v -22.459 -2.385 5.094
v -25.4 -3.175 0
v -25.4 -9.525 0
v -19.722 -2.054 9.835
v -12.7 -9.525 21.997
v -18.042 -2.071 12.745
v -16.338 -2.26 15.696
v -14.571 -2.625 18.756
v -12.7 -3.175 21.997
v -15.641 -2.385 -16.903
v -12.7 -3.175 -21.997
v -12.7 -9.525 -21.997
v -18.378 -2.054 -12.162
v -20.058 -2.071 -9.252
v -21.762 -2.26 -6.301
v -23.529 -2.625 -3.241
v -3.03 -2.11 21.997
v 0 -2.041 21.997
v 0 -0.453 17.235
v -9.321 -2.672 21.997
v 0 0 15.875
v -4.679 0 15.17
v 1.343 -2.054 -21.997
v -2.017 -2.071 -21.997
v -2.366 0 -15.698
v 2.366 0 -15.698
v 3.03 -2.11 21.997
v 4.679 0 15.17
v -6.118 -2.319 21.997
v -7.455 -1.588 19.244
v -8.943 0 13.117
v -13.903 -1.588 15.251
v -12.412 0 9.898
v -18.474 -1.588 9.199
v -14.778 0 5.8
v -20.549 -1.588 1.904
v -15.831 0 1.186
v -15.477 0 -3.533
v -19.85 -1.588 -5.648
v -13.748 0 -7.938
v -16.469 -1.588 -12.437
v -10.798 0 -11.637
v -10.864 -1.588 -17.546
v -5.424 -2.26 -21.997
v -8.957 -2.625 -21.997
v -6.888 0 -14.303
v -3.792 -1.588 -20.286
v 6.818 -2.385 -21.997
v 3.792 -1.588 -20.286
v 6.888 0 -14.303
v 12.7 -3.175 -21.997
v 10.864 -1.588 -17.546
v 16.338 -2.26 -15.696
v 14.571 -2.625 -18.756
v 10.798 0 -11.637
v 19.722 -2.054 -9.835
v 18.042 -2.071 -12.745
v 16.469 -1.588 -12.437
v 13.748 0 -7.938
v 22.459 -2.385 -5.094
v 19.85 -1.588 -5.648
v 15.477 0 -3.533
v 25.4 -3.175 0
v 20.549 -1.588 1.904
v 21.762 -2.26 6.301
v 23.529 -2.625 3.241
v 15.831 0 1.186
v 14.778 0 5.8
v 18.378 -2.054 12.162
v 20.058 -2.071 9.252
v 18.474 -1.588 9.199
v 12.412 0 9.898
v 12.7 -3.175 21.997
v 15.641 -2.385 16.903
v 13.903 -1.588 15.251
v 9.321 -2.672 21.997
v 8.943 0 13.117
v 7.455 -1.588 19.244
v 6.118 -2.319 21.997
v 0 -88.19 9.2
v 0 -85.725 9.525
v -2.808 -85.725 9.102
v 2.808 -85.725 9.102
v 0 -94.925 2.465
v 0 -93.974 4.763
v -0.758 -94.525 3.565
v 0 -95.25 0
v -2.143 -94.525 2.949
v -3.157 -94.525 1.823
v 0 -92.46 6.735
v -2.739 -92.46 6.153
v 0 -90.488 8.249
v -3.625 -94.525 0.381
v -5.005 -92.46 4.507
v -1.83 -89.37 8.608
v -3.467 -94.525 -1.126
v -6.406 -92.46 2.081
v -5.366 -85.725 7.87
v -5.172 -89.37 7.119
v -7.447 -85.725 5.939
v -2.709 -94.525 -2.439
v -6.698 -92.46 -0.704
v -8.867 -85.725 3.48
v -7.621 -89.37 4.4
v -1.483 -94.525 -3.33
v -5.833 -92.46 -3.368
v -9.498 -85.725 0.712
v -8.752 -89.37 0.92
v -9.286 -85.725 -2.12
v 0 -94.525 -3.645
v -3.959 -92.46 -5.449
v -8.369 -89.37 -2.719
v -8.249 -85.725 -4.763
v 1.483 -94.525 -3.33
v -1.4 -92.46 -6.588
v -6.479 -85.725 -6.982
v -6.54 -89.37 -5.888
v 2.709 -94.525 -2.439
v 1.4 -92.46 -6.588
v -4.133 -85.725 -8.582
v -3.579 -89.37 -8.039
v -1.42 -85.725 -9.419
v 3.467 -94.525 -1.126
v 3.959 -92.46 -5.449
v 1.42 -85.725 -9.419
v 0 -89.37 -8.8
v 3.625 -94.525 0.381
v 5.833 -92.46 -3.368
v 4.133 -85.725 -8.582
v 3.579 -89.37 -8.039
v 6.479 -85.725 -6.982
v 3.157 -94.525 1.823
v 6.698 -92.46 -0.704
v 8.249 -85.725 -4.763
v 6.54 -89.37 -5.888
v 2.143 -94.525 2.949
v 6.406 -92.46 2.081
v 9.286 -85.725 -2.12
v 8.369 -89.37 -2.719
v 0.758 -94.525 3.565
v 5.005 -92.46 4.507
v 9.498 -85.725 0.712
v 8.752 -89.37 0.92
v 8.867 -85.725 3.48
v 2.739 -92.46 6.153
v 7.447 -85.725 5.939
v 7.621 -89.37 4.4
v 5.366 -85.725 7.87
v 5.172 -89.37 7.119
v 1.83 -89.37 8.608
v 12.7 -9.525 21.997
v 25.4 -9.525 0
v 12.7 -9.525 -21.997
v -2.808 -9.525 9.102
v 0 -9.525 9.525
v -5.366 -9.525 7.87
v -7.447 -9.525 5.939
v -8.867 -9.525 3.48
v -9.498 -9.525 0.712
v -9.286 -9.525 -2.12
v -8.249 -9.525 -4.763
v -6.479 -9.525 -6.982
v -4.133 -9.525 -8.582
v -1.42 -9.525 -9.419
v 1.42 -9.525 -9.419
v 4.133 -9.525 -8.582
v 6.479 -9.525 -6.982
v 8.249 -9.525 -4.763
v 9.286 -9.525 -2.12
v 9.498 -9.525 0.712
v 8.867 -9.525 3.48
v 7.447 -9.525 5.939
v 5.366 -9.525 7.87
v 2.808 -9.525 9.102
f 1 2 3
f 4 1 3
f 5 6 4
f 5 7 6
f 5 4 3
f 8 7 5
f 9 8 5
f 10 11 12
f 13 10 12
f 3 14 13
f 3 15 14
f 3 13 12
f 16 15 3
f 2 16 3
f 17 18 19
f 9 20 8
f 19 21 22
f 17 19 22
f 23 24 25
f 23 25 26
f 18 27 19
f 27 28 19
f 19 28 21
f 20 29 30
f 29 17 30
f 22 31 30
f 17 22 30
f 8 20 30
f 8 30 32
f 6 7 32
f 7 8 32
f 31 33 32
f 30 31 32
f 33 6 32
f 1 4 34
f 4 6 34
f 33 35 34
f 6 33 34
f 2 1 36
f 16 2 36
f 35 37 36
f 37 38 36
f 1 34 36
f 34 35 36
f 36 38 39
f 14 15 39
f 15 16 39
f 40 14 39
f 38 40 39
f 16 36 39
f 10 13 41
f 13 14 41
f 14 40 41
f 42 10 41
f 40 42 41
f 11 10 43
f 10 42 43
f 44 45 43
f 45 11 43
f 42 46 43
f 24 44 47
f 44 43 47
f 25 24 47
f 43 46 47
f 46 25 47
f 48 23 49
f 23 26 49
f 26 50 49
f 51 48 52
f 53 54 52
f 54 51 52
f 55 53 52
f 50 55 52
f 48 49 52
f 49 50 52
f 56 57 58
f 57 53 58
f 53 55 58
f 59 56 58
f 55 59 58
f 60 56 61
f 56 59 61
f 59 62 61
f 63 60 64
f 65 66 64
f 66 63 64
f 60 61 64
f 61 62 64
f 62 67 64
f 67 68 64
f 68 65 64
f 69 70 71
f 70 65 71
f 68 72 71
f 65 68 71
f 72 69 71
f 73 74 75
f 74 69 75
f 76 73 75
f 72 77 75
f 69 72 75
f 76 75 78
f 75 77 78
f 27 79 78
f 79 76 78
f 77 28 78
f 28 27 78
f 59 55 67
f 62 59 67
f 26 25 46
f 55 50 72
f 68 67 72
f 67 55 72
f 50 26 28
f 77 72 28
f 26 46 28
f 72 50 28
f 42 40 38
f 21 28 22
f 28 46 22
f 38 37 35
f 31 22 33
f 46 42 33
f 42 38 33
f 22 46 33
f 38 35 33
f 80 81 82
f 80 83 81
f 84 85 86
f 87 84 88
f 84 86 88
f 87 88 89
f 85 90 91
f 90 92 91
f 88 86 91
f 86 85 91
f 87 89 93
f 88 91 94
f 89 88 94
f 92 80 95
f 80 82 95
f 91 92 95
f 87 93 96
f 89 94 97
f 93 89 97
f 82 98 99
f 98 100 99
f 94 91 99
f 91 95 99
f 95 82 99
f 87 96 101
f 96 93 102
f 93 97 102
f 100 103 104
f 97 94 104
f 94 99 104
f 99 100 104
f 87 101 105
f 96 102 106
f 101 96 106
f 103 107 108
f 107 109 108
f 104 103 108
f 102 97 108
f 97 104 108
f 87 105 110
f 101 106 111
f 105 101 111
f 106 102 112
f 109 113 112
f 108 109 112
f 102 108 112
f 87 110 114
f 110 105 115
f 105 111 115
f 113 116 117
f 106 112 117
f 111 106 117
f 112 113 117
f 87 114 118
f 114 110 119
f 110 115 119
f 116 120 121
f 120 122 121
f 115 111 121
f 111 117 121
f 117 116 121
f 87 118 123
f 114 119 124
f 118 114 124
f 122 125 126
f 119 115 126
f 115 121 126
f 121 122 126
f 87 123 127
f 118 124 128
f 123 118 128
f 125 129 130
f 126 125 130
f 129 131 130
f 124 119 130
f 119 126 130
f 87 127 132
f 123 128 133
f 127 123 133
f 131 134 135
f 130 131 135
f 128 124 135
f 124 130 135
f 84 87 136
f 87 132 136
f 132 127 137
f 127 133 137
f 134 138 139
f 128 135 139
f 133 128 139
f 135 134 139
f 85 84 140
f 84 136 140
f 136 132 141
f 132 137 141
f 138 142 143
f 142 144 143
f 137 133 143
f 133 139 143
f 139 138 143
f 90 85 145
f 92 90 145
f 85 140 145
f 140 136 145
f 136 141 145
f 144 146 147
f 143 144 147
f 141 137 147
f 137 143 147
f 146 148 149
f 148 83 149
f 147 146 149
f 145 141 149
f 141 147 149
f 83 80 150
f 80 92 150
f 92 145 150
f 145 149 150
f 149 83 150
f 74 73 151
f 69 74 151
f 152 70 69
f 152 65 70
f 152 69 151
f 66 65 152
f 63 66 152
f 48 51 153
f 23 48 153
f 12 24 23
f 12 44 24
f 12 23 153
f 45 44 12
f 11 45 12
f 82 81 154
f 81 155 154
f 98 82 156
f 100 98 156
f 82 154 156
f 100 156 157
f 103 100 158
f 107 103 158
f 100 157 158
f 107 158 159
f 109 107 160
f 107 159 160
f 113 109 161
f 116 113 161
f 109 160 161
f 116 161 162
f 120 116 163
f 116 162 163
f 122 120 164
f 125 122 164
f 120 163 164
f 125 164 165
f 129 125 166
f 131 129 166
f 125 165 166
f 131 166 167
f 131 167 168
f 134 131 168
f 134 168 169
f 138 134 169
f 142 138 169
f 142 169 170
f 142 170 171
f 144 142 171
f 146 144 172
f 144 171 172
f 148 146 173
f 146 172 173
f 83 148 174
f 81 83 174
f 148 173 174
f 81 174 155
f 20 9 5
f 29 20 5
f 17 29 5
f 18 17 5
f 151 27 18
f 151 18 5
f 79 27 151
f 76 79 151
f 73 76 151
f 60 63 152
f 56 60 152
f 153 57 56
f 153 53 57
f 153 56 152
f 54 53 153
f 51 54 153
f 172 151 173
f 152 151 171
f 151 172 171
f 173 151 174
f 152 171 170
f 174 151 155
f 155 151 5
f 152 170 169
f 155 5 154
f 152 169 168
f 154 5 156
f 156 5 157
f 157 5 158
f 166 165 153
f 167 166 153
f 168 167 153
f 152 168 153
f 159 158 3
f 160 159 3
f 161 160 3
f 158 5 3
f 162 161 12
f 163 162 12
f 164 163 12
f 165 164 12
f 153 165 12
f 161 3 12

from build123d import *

# Parameters (mm, degrees)
SKETCH2_OUTSIDE_W = 76.662
SKETCH2_OUTSIDE_H = 76.662
HEX_CUT_DEPTH     = 102.798244091


with BuildPart() as part:
    # Sketch1 → Pin Base (revolve)
    with BuildSketch(Plane.XY, mode=Mode.PRIVATE) as pin_base_sk:
        with BuildLine():
            Line((0, 0), (0, -95.25))
            ThreePointArc((0, -95.25), (6.735192091, -92.460192091), (9.525, -85.725))
            Line((9.525, -85.725), (9.525, -9.525))
            Line((9.525, -9.525), (25.4, -9.525))
            Line((25.4, -9.525), (25.4, -3.175))
            Line((25.4, -3.175), (15.875, 0))
            Line((15.875, 0), (0, 0))
        make_face()
    revolve(pin_base_sk.sketch.rotate(Axis((0, 0, 0), (0, -1, 0)), 90), axis=Axis((0, 0, 0), (0, -1, 0)))

    # Sketch2 outside → Hex Cut (cut, through all)
    with BuildSketch(Plane(origin=(0, 0, 0), x_dir=(1, 0, 0), z_dir=(0, 1, 0))):
        Rectangle(SKETCH2_OUTSIDE_W, SKETCH2_OUTSIDE_H)
        Polygon((25.4, 0), (12.7, 21.997045256), (-12.7, 21.997045256), (-25.4, 0), (-12.7, -21.997045256), (12.7, -21.997045256), align=None, mode=Mode.SUBTRACT)
    extrude(amount=-HEX_CUT_DEPTH, mode=Mode.SUBTRACT)


solid = part.part
